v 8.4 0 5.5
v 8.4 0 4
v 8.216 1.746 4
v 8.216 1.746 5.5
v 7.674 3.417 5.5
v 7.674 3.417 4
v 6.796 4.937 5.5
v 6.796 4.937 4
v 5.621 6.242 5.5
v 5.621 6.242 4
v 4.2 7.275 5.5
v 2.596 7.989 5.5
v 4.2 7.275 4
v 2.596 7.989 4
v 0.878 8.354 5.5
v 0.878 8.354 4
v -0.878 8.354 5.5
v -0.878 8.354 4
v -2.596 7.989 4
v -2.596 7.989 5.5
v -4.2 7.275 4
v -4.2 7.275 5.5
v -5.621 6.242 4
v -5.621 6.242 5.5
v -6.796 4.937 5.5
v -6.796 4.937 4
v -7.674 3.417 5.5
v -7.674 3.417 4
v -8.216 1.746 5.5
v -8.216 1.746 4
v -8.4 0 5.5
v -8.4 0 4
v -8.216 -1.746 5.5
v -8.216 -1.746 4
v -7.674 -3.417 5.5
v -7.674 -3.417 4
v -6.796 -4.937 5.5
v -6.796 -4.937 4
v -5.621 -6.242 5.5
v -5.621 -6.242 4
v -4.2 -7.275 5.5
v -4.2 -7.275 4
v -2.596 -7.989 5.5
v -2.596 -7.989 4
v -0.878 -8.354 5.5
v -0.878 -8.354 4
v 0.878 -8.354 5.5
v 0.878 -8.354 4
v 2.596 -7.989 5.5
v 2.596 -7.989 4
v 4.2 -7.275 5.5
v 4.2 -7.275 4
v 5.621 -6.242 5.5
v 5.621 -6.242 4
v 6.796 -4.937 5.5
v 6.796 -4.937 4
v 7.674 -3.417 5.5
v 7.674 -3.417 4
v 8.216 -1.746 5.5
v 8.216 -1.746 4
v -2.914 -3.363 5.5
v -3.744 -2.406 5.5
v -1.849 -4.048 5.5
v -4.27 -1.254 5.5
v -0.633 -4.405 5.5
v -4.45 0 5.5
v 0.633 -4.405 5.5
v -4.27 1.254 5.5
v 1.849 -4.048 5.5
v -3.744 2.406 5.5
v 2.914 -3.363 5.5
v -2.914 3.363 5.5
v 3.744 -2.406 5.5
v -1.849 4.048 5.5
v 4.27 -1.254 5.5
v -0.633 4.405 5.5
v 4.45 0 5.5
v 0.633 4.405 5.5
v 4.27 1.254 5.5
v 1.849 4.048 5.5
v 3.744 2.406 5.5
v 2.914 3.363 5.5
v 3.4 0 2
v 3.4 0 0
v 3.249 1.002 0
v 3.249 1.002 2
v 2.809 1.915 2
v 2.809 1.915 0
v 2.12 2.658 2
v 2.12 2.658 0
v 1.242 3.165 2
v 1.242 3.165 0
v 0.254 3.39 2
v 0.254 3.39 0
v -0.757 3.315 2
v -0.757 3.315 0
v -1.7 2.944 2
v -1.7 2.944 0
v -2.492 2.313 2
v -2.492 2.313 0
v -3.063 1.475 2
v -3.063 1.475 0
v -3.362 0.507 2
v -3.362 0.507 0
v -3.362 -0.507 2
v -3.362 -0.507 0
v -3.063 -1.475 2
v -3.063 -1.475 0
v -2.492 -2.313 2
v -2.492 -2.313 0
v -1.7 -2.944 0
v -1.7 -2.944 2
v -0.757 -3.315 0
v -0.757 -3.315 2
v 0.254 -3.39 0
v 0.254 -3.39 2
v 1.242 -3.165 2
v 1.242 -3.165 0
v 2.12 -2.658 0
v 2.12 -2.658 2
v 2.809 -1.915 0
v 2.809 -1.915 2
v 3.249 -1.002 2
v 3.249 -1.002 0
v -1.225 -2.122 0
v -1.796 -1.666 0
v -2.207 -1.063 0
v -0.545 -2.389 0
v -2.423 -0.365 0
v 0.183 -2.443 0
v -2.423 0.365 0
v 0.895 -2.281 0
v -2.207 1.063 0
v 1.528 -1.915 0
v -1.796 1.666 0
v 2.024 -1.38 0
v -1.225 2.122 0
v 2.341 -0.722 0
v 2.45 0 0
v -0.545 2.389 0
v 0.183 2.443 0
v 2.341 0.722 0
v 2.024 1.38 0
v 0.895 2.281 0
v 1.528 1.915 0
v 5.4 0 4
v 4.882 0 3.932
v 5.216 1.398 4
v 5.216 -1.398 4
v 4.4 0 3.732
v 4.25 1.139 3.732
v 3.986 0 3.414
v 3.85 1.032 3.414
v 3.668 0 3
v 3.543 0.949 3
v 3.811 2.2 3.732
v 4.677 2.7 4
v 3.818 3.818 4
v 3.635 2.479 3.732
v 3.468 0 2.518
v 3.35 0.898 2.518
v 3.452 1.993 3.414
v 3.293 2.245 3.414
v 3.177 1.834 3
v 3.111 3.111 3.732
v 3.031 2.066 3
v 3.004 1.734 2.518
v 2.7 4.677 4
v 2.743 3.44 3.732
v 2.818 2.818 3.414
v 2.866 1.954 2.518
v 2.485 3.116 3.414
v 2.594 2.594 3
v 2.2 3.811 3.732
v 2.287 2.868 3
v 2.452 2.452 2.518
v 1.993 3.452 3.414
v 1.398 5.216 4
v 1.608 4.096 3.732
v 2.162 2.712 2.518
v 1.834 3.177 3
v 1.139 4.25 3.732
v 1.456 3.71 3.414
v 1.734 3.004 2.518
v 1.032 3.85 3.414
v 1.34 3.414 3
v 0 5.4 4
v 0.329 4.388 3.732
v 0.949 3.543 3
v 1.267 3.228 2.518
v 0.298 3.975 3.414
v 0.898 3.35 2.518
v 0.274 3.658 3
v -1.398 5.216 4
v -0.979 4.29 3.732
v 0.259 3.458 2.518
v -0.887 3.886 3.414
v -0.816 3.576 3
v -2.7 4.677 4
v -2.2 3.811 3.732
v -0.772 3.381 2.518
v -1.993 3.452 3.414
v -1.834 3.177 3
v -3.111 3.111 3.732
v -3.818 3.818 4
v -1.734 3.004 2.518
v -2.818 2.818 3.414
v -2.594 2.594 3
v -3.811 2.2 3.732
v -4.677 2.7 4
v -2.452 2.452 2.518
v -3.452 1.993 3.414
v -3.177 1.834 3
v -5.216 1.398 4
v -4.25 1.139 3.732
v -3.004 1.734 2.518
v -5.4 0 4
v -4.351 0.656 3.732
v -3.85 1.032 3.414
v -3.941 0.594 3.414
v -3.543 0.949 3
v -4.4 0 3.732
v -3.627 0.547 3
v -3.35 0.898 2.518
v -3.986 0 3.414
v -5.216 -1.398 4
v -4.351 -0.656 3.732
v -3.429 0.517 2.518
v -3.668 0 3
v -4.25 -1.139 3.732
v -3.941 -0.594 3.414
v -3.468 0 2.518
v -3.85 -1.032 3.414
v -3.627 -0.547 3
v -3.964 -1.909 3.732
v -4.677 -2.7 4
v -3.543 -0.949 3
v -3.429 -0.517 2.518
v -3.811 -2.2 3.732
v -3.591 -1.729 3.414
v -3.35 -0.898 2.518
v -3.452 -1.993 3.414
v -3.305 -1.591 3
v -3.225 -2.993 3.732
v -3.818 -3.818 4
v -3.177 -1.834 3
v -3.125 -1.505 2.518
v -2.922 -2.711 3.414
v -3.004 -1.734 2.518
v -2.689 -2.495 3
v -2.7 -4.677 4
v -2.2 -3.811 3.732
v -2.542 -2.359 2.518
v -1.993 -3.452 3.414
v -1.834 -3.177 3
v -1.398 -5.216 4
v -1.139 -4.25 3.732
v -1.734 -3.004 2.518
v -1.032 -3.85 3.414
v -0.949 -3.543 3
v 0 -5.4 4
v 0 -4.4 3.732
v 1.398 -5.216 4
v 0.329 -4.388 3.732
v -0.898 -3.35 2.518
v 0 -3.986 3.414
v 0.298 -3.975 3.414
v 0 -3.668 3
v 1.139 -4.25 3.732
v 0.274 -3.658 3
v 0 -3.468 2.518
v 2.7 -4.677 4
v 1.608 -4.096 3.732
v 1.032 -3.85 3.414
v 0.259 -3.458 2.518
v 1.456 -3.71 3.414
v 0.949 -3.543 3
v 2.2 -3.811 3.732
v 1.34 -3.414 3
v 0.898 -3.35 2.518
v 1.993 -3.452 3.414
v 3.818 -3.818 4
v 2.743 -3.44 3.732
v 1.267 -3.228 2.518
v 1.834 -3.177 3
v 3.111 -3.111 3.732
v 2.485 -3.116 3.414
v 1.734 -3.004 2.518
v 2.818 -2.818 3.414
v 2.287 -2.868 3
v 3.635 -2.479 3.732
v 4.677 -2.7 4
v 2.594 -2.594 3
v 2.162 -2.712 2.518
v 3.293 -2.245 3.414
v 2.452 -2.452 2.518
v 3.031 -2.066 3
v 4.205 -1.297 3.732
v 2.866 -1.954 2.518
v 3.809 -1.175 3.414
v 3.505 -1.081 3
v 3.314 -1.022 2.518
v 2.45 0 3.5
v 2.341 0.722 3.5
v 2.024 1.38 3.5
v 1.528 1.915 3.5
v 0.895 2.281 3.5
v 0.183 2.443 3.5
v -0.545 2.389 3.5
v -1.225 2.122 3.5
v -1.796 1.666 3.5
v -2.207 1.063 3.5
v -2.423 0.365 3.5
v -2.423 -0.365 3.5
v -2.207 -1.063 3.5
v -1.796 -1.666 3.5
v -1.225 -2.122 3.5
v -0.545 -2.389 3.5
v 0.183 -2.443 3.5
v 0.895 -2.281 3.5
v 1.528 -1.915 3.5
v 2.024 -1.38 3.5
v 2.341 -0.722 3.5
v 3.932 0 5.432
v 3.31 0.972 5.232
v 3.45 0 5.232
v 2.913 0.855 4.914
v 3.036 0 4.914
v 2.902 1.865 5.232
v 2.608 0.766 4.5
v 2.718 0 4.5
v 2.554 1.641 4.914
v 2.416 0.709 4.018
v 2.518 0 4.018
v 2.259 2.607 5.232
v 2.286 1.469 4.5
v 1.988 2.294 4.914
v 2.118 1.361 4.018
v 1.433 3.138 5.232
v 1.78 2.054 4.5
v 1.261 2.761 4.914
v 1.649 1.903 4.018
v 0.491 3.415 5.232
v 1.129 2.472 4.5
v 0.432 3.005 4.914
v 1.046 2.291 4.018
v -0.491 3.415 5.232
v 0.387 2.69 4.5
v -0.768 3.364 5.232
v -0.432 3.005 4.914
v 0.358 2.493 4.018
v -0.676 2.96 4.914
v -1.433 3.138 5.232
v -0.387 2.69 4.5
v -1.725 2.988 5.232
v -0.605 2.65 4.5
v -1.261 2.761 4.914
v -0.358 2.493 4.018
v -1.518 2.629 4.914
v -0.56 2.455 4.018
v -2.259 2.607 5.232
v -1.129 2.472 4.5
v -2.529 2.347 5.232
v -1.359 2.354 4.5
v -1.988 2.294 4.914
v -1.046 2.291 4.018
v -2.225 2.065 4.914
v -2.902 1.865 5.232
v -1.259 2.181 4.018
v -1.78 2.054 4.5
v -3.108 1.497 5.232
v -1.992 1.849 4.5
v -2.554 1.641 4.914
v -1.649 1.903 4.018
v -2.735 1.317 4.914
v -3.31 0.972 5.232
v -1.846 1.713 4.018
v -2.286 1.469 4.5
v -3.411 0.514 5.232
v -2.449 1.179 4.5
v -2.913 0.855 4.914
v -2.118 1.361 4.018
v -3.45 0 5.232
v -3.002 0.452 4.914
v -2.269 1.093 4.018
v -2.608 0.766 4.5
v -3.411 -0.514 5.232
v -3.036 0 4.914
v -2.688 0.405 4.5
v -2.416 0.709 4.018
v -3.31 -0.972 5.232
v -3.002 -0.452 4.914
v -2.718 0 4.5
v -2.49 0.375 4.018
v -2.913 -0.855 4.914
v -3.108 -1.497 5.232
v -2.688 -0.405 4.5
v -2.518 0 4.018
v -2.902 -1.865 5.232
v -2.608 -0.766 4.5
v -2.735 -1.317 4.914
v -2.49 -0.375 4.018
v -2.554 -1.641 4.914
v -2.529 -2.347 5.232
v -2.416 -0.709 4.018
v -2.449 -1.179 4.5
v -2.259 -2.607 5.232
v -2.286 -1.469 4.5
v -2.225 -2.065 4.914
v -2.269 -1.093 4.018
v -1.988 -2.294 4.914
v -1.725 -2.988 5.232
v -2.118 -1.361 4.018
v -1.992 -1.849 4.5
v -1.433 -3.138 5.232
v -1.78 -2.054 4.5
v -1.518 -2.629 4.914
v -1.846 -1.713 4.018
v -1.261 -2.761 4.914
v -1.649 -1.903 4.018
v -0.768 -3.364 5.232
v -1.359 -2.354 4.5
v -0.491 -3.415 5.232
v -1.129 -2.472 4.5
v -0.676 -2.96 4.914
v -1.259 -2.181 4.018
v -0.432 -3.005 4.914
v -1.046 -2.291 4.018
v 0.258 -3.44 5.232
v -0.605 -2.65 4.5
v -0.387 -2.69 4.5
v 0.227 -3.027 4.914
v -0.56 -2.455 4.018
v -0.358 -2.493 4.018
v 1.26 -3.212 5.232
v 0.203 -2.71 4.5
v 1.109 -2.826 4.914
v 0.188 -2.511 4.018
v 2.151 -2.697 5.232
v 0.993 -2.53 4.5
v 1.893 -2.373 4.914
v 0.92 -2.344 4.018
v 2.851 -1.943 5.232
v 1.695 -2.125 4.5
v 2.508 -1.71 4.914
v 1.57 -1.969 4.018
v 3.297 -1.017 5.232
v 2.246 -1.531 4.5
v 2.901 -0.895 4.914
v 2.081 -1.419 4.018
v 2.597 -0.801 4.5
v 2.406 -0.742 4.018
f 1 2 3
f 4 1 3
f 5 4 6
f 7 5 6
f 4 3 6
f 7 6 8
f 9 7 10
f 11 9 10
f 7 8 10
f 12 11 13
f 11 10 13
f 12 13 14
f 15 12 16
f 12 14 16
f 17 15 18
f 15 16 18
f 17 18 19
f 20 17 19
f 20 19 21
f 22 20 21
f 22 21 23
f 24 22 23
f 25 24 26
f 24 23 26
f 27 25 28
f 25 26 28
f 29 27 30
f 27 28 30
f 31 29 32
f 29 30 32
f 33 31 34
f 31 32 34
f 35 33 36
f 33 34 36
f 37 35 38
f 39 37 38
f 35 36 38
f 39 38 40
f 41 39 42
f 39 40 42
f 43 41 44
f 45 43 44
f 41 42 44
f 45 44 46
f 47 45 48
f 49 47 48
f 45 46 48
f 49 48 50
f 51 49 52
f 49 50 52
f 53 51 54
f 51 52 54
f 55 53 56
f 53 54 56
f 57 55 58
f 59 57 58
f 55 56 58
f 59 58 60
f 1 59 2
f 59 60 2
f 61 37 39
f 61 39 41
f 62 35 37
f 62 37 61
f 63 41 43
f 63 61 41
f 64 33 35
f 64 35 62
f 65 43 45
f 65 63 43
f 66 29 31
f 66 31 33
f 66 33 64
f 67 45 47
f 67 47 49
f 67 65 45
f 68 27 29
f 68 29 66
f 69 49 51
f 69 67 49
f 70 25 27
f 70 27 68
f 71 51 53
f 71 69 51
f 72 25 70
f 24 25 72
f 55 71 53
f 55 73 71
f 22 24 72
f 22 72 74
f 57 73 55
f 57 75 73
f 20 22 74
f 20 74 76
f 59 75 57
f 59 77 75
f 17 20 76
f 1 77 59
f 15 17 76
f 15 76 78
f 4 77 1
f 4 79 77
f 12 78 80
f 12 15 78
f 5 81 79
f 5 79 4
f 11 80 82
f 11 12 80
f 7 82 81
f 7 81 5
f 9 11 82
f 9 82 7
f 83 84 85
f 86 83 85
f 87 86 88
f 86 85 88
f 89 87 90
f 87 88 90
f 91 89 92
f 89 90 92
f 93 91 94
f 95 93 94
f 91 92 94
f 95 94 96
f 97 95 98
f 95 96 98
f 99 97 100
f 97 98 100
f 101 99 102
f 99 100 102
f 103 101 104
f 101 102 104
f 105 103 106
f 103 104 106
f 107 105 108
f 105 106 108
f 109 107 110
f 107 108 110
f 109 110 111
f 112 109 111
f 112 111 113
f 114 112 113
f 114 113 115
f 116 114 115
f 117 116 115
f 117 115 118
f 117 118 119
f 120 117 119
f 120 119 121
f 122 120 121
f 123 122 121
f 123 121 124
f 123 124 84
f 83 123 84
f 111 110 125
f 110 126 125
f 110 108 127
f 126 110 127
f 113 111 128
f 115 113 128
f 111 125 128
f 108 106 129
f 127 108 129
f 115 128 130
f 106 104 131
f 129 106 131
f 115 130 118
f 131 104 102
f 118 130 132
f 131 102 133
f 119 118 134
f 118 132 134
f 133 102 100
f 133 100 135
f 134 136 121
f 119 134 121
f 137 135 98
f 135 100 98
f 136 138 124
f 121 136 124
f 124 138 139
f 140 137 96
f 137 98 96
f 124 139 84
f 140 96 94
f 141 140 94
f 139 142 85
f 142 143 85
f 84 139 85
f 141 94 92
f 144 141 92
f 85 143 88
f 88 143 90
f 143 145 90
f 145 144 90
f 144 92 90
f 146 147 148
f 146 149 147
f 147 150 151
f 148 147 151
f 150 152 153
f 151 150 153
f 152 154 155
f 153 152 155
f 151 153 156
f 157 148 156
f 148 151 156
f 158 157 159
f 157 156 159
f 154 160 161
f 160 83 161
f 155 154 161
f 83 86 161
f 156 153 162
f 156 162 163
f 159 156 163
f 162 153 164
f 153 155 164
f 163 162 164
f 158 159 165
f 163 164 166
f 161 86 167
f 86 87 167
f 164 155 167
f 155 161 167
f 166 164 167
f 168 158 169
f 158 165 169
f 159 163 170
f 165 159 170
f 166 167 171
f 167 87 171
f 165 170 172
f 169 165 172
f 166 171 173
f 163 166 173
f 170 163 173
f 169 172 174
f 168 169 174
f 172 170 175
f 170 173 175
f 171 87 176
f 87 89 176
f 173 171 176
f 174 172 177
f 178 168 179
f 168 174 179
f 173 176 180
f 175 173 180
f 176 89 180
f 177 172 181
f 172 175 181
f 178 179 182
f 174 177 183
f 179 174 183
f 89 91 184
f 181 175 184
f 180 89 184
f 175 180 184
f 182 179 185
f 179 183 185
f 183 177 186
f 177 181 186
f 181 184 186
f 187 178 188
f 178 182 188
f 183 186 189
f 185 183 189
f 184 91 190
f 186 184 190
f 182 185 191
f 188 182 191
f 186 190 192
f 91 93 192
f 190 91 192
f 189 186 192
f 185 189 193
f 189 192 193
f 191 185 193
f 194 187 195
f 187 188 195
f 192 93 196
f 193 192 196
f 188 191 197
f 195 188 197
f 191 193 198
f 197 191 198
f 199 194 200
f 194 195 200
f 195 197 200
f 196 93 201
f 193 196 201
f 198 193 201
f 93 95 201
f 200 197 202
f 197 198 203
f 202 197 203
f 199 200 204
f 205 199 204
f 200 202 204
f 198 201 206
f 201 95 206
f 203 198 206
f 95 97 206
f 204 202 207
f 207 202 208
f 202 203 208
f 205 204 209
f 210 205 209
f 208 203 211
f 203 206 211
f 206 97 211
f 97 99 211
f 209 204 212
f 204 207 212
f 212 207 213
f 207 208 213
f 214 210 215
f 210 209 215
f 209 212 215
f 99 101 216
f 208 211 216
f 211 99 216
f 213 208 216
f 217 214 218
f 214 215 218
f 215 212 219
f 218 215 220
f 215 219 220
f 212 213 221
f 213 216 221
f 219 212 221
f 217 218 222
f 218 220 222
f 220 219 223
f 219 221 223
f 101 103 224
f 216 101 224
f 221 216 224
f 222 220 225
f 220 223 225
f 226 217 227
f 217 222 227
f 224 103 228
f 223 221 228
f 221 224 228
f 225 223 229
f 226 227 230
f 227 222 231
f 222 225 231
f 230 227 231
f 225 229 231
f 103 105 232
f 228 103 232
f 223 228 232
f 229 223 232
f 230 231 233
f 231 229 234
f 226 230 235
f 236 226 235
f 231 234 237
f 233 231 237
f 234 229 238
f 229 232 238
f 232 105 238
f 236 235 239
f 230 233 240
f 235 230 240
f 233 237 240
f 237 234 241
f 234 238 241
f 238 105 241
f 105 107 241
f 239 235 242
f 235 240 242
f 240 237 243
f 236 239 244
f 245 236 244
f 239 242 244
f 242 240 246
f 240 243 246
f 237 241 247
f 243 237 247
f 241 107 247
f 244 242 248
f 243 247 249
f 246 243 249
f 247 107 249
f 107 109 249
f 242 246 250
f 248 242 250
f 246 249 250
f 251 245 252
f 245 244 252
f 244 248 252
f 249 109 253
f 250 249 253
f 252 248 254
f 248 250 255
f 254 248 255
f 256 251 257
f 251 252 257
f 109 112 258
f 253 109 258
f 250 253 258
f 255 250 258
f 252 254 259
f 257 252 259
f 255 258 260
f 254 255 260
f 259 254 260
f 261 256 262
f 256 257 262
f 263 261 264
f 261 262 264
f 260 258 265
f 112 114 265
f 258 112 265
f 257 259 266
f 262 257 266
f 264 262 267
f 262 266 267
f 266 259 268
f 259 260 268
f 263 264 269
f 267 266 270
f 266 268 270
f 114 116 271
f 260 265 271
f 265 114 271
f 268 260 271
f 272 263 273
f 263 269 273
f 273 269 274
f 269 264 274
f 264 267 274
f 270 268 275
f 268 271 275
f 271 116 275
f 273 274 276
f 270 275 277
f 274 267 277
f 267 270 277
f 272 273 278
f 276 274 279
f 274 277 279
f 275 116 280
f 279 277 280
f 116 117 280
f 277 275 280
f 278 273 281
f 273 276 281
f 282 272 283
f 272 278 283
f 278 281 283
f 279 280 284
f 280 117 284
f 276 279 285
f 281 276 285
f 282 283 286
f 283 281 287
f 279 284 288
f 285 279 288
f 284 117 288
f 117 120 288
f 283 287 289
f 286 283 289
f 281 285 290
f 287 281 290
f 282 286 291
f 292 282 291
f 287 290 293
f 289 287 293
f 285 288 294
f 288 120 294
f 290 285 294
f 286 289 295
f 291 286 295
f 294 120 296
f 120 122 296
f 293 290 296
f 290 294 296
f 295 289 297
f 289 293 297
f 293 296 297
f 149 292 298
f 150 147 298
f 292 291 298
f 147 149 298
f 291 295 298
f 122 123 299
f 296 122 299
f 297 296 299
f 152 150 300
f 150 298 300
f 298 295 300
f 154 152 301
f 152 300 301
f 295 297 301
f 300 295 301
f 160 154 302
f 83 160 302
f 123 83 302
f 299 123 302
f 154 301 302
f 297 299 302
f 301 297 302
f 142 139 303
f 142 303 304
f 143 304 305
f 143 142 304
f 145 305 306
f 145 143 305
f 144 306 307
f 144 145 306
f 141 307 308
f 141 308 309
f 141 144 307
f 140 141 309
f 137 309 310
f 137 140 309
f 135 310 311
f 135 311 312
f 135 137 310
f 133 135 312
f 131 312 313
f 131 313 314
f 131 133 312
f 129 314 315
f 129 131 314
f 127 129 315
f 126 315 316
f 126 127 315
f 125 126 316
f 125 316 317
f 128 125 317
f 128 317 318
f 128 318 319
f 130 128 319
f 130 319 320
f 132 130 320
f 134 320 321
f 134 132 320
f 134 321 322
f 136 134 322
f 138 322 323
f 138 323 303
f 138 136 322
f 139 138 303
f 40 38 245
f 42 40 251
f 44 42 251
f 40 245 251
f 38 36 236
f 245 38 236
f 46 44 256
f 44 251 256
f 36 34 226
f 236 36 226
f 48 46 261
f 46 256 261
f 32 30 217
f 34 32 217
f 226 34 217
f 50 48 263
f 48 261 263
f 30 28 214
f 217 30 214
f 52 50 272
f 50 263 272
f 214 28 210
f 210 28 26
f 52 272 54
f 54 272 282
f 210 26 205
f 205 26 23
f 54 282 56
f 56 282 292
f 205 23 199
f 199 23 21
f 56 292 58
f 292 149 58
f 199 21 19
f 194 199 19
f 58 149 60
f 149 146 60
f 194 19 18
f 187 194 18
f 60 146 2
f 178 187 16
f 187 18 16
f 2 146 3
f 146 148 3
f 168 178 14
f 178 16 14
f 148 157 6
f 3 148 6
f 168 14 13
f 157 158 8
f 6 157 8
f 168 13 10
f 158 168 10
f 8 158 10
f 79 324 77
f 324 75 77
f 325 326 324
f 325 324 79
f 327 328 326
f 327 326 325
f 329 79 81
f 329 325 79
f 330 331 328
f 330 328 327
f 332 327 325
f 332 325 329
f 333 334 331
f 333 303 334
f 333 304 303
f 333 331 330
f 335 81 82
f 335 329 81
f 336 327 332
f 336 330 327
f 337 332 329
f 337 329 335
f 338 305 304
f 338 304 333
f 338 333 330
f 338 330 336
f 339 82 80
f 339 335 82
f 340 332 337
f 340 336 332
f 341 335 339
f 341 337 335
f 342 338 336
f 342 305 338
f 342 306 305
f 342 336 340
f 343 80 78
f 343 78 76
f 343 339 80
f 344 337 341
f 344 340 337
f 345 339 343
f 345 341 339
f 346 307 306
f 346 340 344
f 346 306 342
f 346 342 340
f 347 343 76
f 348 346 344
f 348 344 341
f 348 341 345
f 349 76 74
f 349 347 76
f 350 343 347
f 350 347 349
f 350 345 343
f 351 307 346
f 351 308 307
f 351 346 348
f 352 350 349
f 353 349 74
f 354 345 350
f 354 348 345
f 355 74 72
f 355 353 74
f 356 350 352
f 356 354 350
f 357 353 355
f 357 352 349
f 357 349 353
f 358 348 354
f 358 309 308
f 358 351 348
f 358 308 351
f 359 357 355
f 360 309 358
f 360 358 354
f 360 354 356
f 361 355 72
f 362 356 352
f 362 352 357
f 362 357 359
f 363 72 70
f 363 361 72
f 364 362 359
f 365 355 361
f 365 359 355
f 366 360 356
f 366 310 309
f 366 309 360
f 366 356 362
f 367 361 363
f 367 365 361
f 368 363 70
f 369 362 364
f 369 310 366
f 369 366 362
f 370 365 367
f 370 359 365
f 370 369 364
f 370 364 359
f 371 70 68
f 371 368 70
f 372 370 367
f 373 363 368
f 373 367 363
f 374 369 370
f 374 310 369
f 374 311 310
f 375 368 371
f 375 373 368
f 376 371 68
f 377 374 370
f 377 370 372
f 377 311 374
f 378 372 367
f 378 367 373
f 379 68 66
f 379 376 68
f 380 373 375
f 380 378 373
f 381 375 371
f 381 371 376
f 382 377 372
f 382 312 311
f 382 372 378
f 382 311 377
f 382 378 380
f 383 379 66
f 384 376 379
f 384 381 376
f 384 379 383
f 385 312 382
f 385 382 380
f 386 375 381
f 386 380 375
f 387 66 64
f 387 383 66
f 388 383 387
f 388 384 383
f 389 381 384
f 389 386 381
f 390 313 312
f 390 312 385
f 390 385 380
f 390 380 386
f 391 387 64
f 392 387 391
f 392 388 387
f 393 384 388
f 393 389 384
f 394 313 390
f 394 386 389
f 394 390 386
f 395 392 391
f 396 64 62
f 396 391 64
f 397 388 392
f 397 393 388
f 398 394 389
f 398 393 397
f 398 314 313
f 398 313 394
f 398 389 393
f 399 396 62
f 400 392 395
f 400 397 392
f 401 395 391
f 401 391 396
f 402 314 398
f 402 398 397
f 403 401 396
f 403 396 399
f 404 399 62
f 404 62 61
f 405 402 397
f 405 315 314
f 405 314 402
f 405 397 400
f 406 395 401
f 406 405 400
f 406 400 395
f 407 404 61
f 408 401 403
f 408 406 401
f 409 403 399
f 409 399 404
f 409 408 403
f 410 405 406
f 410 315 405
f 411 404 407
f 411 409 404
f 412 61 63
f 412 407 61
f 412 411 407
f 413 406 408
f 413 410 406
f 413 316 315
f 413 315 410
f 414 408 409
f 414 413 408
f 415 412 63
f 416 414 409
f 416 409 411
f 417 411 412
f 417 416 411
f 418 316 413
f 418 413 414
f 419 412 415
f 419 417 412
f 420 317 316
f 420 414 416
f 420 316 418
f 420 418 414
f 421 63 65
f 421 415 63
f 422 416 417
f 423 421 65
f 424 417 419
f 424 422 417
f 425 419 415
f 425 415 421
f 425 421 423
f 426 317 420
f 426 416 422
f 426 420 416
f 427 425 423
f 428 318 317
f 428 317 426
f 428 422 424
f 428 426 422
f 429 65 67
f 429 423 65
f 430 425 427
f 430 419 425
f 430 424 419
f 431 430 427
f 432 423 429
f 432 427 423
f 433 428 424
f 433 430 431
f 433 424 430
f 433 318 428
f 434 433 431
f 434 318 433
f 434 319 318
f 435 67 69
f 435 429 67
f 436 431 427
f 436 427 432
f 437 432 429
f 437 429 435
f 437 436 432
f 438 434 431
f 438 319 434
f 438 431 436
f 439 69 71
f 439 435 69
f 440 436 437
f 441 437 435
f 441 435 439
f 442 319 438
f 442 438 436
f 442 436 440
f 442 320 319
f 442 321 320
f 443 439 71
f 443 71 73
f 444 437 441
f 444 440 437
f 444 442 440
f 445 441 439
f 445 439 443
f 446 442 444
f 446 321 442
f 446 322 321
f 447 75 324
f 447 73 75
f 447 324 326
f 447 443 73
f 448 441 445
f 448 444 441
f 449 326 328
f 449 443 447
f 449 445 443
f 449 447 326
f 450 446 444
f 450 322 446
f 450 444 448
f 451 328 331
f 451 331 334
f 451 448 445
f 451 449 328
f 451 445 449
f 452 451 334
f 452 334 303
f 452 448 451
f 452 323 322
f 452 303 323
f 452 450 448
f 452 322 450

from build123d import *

# Parameters (mm, degrees)
SKETCH1_R           = 3.4
SKETCH1_R_2         = 2.45
BOSS_EXTRUDE1_DEPTH = 5.5
BOSS_EXTRUDE2_START = -1.5
SKETCH2_R           = 8.4
SKETCH2_R_2         = 3.4
BOSS_EXTRUDE2_DEPTH = 1.5
FILLET1_R           = 2
FILLET2_R           = 2


with BuildPart() as part:
    # Sketch1 → Boss-Extrude1 (new body)
    with BuildSketch(Plane.XY):
        Circle(SKETCH1_R)
        Circle(SKETCH1_R_2, mode=Mode.SUBTRACT)
    extrude(amount=BOSS_EXTRUDE1_DEPTH)

    # Sketch2 → Boss-Extrude2 (add)
    with BuildSketch(Plane.XY.offset(5.5).offset(BOSS_EXTRUDE2_START)):
        Circle(SKETCH2_R)
        Circle(SKETCH2_R_2, mode=Mode.SUBTRACT)
    extrude(amount=BOSS_EXTRUDE2_DEPTH)

    # Fillet1
    fillet1_edges = [part.edges().sort_by_distance(p)[0] for p in [
        (-3.4, 0, 4),
    ]]
    fillet(fillet1_edges, radius=FILLET1_R)

    # Fillet2
    fillet2_edges = [part.edges().sort_by_distance(p)[0] for p in [
        (-2.45, 0, 5.5),
    ]]
    fillet(fillet2_edges, radius=FILLET2_R)


solid = part.part
